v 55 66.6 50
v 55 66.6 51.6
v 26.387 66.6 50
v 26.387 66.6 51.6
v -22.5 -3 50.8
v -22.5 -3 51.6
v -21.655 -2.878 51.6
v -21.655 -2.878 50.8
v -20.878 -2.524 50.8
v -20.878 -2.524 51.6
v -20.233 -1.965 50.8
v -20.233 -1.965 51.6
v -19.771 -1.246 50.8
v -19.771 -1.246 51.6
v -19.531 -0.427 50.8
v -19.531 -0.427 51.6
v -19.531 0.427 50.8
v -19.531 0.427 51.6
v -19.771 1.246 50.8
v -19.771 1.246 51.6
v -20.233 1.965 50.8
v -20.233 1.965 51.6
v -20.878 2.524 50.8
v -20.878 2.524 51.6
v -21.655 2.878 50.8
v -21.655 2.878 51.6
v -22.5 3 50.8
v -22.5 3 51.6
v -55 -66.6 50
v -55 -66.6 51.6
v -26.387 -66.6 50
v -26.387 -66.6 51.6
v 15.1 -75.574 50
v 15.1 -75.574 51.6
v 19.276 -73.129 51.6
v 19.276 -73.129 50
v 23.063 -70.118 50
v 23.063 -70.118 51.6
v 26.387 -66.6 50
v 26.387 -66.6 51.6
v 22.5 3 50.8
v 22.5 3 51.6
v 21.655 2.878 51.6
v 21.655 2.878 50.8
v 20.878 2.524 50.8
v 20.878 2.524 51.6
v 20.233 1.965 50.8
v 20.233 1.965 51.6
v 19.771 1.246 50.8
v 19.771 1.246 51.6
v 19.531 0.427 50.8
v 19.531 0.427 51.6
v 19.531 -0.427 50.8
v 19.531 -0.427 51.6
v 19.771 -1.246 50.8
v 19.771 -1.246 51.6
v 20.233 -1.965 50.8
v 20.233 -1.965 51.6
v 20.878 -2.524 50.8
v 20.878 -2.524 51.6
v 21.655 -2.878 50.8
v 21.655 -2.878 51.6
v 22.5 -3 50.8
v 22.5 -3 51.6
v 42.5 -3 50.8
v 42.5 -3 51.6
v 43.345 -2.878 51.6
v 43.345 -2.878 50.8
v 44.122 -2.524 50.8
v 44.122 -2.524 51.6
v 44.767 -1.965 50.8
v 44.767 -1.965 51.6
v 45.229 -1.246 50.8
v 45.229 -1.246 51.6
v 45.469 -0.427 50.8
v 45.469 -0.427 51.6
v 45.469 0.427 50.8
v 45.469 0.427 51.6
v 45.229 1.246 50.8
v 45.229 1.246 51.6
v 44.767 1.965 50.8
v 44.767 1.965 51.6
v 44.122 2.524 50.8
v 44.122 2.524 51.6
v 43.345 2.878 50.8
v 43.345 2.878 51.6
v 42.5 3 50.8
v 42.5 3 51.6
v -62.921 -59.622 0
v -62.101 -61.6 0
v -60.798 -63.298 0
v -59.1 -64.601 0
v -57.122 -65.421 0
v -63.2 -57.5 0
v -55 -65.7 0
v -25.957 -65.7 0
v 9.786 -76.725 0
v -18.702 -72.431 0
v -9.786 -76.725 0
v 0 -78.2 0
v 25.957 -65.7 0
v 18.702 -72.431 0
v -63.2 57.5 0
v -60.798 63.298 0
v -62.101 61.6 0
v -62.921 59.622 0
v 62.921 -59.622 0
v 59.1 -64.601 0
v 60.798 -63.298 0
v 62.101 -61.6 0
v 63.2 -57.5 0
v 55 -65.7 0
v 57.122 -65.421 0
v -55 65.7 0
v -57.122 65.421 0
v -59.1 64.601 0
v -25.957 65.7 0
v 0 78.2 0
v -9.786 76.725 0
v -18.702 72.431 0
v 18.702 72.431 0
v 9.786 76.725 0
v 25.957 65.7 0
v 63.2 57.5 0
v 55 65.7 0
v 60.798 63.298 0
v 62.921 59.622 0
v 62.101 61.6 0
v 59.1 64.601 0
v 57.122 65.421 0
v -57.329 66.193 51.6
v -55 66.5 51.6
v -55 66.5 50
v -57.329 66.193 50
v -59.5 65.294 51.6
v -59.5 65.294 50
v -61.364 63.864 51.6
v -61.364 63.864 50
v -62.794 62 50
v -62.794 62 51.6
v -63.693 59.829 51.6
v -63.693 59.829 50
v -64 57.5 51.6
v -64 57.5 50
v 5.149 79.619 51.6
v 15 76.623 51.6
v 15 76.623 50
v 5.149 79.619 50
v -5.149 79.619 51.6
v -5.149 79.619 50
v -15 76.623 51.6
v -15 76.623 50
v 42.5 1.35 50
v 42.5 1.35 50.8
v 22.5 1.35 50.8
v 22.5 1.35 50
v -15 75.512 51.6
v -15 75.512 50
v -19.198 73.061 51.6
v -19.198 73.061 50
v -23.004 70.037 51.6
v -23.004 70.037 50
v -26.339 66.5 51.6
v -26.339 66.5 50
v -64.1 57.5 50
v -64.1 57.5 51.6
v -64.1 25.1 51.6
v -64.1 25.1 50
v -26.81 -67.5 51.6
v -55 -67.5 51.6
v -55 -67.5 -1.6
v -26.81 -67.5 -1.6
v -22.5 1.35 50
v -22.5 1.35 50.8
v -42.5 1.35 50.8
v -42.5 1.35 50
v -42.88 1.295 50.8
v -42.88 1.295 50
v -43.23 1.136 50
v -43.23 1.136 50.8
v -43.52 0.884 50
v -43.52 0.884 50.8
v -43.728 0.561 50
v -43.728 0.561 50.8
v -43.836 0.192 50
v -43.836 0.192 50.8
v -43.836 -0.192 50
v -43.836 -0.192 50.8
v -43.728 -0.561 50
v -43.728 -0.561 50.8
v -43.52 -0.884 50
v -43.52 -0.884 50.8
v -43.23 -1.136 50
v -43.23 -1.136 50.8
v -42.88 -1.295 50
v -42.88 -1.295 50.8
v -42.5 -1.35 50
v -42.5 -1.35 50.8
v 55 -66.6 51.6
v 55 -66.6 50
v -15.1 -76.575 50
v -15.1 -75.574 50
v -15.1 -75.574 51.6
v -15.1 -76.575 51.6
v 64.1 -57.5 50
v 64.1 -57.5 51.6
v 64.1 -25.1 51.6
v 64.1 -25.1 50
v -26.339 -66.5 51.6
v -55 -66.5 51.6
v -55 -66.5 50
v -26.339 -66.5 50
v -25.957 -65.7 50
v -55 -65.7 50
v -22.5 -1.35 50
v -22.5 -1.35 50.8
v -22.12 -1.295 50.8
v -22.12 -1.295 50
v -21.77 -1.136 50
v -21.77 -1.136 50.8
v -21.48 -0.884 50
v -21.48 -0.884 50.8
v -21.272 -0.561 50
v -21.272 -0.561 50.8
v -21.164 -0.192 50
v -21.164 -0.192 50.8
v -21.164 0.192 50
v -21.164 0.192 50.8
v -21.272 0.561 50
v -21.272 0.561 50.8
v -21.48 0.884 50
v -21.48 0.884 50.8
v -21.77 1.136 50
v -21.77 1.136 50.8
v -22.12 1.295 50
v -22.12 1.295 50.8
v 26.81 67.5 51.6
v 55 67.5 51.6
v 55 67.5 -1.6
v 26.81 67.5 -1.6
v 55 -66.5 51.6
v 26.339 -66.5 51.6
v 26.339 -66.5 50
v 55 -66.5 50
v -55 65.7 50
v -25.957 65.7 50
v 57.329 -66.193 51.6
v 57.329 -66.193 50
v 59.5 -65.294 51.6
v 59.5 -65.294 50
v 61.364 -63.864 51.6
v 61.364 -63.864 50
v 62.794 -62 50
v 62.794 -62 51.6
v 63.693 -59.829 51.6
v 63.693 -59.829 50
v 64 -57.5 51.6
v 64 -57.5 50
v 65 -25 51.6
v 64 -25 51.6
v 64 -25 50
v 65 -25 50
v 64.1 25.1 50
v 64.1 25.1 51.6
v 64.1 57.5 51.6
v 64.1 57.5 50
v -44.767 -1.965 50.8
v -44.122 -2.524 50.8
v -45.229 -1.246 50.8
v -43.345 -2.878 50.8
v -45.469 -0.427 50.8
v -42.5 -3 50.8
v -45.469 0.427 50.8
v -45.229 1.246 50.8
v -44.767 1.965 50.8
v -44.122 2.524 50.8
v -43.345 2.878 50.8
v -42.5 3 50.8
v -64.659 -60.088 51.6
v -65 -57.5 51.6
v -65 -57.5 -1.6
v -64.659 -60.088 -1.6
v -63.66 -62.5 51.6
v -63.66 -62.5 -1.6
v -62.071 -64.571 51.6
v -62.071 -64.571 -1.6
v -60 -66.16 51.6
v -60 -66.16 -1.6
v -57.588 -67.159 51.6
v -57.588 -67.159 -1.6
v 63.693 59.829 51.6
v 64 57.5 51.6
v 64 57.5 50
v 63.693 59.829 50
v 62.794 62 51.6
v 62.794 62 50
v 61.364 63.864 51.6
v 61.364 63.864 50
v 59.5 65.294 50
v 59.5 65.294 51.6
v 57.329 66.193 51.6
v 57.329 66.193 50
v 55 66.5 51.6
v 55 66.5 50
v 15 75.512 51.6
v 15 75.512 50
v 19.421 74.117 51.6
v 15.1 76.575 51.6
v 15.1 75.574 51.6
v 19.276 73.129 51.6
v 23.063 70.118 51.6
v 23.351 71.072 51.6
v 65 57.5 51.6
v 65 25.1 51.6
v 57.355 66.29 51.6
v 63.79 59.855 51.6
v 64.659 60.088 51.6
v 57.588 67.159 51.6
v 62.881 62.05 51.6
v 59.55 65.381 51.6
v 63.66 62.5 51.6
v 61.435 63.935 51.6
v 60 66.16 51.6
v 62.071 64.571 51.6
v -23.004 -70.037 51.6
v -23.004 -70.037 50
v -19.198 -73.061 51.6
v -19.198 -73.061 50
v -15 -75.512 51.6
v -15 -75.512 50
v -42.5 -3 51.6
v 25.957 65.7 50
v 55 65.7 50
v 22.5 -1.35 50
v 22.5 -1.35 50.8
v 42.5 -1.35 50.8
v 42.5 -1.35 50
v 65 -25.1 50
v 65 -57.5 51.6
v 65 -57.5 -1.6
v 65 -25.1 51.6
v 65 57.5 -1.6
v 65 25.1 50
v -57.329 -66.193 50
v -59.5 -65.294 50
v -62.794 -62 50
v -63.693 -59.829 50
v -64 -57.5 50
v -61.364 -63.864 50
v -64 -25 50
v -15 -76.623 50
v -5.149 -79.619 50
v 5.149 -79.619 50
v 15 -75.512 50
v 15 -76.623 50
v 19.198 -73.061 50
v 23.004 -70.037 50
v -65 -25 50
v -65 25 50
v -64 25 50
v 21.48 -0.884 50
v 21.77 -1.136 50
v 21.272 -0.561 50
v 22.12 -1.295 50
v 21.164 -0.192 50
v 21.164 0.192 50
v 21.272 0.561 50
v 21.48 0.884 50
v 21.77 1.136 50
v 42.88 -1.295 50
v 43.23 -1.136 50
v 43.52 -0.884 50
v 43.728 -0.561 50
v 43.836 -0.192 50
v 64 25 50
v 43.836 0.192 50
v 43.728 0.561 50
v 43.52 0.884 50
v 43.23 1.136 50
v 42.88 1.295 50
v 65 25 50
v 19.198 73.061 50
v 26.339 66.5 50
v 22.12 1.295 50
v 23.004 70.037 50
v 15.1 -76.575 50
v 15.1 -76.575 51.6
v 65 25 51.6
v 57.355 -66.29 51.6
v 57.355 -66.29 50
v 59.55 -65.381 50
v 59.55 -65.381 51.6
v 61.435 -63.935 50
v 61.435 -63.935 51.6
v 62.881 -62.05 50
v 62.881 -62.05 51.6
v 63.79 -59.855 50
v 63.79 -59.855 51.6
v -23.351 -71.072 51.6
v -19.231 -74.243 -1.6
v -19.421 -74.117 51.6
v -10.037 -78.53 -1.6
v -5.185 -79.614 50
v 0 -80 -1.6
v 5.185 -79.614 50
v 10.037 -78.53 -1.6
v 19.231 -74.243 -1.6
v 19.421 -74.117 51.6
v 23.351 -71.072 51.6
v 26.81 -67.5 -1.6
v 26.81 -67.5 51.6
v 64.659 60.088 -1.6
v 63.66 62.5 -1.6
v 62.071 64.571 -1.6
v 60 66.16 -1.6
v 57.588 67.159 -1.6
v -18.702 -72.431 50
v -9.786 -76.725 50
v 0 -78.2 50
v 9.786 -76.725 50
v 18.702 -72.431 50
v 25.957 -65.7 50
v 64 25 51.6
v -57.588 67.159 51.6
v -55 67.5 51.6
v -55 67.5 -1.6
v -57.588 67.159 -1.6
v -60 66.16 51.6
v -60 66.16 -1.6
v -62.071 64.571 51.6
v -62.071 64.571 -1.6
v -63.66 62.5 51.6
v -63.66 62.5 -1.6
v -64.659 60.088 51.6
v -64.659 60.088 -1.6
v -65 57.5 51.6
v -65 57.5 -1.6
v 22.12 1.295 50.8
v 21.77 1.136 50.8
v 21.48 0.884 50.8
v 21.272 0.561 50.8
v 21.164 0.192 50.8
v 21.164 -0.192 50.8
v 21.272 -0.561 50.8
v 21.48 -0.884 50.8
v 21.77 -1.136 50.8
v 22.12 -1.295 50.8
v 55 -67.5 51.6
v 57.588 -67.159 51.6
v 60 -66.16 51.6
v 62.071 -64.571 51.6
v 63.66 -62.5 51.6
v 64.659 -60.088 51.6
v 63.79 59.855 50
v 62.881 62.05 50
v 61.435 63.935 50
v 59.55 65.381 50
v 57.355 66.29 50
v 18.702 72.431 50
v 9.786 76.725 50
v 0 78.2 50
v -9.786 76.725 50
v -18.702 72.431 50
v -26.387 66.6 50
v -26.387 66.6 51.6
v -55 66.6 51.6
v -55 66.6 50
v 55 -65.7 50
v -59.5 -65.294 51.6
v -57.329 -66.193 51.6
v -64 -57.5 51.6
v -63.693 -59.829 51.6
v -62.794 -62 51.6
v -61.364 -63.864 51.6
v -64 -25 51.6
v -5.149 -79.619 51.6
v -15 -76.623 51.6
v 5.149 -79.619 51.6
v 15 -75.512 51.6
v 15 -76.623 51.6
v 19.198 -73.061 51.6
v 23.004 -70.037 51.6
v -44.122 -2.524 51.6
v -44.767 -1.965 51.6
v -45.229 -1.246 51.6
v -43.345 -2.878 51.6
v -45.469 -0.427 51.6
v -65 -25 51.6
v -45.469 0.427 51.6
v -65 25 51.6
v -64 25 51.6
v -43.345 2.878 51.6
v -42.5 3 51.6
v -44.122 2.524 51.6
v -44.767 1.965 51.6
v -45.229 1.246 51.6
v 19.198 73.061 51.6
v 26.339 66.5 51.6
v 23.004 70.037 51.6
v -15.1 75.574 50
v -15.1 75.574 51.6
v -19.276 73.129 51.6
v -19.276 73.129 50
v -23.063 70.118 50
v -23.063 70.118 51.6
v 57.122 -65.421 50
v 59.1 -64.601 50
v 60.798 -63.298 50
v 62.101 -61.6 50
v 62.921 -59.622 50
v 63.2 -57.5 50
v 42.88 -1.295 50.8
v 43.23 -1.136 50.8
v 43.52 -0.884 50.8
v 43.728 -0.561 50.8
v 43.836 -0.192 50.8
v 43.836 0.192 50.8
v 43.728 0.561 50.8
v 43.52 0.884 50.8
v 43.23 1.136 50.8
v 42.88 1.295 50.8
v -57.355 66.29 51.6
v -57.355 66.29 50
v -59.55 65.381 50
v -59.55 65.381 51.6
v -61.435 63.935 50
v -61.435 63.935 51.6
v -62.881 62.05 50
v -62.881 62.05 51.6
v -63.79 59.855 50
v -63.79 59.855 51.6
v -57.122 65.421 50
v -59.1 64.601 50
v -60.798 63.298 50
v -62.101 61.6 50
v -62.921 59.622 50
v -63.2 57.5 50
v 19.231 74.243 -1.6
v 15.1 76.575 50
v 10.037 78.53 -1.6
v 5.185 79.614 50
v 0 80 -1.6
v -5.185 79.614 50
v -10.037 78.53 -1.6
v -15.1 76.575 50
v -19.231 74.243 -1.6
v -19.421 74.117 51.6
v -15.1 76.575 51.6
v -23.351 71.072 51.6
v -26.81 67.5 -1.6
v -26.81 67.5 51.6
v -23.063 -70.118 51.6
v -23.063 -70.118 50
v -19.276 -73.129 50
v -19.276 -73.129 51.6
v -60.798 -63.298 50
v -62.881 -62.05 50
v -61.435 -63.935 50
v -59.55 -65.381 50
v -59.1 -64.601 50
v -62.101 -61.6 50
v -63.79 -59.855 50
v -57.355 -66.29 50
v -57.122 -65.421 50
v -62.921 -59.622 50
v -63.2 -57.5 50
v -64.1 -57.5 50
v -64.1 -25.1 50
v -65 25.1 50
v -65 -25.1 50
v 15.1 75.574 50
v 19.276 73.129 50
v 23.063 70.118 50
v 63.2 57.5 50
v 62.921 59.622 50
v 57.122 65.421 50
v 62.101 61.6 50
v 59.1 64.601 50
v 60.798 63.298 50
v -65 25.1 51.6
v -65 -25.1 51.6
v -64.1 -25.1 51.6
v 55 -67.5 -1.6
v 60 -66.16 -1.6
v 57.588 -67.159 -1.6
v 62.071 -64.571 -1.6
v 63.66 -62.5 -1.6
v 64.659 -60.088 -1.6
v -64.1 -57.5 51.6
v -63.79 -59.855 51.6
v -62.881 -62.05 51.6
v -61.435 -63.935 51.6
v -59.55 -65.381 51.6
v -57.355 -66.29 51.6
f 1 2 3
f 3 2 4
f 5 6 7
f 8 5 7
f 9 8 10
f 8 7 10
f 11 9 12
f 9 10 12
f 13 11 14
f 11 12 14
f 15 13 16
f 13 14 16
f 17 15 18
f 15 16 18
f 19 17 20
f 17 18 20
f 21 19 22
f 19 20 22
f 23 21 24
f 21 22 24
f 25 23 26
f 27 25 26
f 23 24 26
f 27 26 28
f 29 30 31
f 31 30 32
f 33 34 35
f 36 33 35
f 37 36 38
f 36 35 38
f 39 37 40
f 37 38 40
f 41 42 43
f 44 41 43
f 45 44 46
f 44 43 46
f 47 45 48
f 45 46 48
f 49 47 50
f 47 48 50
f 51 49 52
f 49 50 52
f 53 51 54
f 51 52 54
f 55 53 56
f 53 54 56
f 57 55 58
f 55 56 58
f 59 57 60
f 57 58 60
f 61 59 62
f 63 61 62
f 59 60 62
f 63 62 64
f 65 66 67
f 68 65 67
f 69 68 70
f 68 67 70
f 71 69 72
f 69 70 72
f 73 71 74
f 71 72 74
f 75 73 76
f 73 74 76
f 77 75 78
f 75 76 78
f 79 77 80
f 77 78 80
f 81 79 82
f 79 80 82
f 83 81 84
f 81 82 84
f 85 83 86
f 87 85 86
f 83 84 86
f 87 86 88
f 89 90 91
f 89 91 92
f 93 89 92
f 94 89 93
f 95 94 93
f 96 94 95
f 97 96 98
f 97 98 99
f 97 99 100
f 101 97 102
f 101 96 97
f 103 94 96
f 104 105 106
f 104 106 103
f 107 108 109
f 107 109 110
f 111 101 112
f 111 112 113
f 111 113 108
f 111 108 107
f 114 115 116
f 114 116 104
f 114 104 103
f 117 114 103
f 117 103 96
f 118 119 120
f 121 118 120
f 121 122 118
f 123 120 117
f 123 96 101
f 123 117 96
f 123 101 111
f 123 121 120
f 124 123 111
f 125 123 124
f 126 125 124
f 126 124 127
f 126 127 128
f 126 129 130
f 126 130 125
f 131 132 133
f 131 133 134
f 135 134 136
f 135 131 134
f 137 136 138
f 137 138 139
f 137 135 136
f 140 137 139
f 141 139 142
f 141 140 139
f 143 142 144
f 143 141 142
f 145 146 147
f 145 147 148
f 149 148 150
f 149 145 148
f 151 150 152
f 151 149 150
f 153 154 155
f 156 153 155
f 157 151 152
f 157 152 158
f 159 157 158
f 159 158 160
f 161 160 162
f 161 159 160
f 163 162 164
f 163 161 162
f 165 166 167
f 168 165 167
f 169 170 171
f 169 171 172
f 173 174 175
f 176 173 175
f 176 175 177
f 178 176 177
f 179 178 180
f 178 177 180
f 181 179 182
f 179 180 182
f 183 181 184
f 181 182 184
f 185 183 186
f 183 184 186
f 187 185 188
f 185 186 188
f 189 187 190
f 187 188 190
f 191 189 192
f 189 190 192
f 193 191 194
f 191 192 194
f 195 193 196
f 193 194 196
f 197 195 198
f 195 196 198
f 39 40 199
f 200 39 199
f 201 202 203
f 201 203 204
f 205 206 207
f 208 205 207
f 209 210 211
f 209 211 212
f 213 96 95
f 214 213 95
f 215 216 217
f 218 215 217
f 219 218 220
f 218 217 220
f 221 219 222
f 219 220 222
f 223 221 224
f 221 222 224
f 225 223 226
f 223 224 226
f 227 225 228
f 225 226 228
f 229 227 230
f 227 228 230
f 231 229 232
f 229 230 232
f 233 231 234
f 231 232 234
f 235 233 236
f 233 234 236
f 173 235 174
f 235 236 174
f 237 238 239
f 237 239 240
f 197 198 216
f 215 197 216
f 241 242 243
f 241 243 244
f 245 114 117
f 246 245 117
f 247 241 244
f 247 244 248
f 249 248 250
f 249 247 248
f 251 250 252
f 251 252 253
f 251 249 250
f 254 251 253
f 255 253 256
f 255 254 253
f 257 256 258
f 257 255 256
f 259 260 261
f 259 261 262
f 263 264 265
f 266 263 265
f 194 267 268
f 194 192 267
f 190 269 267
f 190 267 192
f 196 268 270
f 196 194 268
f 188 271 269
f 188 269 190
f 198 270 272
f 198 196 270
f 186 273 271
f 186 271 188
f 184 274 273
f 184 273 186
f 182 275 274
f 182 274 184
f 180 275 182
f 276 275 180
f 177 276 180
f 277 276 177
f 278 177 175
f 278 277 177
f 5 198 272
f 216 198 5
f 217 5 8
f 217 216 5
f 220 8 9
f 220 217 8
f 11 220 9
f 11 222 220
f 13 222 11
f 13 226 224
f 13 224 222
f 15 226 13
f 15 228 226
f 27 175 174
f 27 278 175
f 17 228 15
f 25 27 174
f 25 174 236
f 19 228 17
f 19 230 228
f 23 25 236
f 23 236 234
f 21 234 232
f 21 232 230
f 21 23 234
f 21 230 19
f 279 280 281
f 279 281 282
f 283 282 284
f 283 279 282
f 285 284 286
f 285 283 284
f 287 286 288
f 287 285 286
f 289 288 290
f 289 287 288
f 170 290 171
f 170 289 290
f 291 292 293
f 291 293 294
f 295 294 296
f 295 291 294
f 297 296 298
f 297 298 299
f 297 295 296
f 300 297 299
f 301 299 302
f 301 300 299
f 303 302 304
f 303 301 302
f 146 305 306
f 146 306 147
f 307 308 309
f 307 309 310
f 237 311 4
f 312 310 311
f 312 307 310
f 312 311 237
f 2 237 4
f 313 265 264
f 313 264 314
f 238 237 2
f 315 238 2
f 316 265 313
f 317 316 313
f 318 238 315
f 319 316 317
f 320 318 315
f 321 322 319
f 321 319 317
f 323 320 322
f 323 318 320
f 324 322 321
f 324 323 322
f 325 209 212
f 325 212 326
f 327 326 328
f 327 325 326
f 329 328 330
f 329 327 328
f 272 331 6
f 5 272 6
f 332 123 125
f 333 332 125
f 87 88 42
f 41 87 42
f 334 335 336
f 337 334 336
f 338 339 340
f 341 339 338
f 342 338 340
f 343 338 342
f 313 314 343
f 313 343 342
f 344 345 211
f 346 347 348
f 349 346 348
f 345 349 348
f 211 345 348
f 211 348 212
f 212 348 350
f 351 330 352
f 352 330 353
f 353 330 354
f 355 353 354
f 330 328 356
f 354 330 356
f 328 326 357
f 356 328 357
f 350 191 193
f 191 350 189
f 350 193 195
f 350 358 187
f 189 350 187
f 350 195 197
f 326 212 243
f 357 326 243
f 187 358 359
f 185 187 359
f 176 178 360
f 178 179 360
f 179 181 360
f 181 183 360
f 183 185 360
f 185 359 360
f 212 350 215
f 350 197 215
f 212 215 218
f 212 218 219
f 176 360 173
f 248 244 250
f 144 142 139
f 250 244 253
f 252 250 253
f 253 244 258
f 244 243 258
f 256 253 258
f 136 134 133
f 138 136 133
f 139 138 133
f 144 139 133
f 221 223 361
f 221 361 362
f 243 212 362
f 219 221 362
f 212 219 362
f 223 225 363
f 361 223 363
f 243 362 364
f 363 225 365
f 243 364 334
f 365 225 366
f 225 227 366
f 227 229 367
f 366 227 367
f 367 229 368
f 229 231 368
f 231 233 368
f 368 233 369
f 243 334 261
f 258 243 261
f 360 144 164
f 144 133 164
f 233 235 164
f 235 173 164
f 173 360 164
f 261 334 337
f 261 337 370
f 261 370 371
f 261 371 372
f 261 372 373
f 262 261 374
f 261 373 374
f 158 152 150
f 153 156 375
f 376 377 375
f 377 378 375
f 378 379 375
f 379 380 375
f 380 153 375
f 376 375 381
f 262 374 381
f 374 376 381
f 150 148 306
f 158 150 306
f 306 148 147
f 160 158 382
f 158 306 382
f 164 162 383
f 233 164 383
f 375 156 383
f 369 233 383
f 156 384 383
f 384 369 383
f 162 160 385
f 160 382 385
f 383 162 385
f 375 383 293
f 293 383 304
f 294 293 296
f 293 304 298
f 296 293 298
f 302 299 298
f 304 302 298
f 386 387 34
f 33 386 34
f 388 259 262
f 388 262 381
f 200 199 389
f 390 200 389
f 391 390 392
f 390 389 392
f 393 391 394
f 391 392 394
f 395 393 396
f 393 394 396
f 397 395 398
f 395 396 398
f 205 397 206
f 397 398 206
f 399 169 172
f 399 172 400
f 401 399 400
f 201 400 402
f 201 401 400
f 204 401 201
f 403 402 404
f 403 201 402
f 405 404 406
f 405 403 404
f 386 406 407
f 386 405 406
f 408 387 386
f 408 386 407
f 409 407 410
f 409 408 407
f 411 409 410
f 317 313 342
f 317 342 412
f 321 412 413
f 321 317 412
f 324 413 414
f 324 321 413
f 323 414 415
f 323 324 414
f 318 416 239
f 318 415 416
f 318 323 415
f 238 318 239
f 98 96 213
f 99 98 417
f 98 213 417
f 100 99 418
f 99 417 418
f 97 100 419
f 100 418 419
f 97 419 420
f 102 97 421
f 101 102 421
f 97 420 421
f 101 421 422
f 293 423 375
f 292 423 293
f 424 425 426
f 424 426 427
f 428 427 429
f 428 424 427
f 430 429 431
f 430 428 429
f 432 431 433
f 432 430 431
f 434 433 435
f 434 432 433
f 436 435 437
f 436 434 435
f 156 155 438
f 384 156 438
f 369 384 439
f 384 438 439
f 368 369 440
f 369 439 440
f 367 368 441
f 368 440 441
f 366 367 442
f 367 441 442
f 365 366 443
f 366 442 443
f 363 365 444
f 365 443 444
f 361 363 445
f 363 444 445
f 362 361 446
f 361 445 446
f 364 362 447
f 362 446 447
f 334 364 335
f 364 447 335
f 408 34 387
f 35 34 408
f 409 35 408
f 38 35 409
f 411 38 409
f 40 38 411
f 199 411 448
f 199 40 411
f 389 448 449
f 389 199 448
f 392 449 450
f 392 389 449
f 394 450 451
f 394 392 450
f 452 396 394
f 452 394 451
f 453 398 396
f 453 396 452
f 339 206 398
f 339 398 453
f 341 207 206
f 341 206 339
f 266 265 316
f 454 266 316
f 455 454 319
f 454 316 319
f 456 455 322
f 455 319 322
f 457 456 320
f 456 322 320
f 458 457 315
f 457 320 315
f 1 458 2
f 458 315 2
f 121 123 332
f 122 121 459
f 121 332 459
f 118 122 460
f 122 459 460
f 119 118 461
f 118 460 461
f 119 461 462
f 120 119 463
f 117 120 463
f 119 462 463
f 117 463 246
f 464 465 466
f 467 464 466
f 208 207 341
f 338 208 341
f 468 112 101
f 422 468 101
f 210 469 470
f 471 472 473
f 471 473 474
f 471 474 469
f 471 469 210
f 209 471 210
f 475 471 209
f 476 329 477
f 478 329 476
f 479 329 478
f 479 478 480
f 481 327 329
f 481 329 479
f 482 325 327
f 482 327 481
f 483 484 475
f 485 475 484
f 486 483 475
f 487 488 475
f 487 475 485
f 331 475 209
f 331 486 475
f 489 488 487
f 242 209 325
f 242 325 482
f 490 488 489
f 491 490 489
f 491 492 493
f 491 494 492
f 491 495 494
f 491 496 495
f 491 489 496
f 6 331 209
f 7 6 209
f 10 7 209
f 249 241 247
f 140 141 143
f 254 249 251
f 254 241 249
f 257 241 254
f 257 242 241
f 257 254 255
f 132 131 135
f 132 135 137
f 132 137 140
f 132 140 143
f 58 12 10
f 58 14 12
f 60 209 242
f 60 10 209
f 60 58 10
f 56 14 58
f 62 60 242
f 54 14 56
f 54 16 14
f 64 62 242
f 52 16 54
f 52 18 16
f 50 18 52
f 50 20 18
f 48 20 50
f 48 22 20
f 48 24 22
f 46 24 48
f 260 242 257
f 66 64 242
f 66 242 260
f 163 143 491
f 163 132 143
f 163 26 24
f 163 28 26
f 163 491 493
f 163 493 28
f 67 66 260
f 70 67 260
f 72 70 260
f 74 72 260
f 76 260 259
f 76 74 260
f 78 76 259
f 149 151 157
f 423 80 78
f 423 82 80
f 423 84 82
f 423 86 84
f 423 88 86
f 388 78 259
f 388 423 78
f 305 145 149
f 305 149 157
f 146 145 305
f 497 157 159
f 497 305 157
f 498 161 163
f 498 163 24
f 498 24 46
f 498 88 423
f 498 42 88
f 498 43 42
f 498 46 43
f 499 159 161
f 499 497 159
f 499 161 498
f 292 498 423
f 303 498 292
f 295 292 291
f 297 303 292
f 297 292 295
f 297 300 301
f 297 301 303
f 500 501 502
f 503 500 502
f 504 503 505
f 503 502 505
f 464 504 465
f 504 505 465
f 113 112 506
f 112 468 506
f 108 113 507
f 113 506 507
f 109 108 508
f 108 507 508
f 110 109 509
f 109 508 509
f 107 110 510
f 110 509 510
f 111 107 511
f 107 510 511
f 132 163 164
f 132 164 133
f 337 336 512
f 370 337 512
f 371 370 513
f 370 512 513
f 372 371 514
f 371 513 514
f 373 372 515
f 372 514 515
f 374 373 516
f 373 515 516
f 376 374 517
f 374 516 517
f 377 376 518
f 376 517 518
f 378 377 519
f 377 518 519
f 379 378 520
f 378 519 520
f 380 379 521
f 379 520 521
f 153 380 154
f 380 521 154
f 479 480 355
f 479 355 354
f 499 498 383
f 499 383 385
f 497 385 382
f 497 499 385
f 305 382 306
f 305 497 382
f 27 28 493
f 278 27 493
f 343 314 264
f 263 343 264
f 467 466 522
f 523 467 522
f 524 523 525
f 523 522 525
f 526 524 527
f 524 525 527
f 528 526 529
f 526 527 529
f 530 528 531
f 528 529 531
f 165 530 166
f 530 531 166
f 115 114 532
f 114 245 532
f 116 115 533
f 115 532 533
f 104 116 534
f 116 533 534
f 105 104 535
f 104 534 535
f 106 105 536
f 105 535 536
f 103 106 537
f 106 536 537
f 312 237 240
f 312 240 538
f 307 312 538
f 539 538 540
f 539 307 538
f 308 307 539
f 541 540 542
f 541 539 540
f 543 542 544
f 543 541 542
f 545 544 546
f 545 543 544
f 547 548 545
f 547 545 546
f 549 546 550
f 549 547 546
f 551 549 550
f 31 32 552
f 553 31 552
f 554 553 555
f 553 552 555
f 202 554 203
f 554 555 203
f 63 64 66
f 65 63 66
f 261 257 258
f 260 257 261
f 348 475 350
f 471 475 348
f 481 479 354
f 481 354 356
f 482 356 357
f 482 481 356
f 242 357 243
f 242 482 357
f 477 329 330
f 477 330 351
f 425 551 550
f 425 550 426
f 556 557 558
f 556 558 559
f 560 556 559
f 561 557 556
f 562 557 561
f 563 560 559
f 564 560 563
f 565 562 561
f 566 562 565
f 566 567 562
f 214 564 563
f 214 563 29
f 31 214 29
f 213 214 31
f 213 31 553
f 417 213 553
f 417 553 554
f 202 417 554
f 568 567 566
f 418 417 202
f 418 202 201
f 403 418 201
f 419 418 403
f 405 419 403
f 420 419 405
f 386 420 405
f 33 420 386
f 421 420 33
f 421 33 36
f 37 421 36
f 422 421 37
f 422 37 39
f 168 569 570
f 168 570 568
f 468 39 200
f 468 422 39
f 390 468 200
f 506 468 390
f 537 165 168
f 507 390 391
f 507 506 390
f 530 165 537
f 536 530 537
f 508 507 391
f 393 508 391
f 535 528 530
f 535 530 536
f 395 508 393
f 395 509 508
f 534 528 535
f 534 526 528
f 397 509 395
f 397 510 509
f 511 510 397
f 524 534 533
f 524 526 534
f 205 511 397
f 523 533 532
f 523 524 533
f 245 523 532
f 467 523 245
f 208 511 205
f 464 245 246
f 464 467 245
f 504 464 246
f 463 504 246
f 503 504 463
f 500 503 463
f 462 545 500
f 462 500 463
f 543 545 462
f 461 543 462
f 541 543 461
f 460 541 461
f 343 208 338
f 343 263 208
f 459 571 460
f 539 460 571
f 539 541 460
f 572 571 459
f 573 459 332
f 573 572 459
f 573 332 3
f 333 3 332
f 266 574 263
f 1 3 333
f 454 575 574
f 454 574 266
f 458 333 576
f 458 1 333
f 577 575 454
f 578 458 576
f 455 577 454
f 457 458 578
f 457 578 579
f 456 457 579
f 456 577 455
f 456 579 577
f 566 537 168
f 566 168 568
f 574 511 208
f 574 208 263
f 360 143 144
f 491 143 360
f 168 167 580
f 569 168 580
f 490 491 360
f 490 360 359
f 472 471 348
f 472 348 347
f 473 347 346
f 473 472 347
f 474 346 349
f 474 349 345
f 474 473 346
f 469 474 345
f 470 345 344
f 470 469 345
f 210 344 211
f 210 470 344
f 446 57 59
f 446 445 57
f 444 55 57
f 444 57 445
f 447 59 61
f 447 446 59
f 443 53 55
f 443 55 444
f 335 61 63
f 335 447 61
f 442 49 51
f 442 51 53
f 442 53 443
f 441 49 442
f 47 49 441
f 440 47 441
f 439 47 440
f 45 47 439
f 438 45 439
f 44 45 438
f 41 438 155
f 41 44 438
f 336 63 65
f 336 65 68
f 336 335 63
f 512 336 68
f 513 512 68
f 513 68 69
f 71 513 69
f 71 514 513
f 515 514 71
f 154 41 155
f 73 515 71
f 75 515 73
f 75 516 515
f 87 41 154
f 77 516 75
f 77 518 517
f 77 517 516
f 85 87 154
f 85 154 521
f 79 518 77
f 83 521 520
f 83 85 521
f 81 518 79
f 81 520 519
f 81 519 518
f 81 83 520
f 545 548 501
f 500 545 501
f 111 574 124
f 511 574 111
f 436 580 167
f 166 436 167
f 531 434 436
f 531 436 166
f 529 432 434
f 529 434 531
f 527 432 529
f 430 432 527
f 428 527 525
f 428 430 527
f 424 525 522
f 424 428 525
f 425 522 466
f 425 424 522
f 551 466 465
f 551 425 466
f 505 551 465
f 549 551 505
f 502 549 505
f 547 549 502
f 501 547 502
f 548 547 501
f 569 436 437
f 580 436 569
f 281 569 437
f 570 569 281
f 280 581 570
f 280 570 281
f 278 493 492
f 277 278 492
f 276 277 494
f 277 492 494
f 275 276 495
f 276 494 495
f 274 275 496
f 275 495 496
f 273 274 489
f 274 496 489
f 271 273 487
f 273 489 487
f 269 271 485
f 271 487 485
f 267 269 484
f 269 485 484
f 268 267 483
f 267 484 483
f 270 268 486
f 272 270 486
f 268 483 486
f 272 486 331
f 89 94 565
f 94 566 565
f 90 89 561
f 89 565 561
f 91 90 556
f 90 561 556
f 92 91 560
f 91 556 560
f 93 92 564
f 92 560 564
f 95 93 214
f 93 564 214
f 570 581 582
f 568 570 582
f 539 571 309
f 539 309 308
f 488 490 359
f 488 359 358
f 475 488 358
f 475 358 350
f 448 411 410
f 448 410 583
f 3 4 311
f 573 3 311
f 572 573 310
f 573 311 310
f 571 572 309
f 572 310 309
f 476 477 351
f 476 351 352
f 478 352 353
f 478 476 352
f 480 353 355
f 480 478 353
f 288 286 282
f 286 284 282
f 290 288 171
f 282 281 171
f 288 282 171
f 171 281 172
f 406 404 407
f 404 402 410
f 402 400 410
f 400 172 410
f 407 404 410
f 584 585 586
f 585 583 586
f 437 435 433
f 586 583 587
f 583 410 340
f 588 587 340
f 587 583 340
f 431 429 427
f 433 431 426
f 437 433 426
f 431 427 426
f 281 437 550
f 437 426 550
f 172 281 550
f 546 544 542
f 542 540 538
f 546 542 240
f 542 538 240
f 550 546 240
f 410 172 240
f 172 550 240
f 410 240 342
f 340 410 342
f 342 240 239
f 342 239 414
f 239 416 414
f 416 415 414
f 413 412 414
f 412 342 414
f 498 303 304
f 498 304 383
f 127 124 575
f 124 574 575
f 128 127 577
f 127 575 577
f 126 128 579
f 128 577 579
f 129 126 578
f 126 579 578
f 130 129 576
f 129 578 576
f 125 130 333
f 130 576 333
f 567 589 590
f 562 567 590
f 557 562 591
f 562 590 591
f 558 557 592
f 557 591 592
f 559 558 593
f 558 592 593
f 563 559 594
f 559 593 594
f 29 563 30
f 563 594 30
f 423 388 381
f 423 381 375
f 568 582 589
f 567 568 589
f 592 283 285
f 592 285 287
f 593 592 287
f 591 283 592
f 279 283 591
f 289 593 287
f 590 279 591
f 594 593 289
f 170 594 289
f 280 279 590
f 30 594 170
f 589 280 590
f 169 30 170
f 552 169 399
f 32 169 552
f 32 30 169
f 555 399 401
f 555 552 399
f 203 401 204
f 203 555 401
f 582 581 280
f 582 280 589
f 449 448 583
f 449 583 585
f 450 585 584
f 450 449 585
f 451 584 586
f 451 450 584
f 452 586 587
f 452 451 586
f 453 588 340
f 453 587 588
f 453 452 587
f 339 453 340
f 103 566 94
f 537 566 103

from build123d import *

# Parameters (mm, degrees)
F11_DEPTH = 53.201
F12_DEPTH = 0.8


with BuildPart() as f4:
    # F4: sweep along a path in F3
    with BuildLine(Plane.XZ) as f4_path:
        Line((0, 0), (0, -1.6))
    # F1 (on Top) → F4 (sweep)
    with BuildSketch(Plane.XY):
        with BuildLine():
            ThreePointArc((-55, 67.5), (-62.0710678119, 64.5710678119), (-65, 57.5))
            Line((-65, 57.5), (-65, -57.5))
            ThreePointArc((-65, -57.5), (-62.0710678119, -64.5710678119), (-55, -67.5))
            Line((-55, -67.5), (-26.8095132369, -67.5))
            ThreePointArc((-26.8095132369, -67.5), (0, -80), (26.8095132369, -67.5))
            Line((26.8095132369, -67.5), (55, -67.5))
            ThreePointArc((55, -67.5), (62.0710678119, -64.5710678119), (65, -57.5))
            Line((65, -57.5), (65, 57.5))
            ThreePointArc((65, 57.5), (62.0710678119, 64.5710678119), (55, 67.5))
            Line((55, 67.5), (26.8095132369, 67.5))
            ThreePointArc((26.8095132369, 67.5), (0, 80), (-26.8095132369, 67.5))
            Line((-26.8095132369, 67.5), (-55, 67.5))
        make_face()
    sweep(path=f4_path.line)

    # F5: sweep along a path in F3
    with BuildLine(Plane.XZ) as f5_path:
        Line((0, 0), (0, 50))
        Line((0, 50), (0, 51.6))
    # F2 (on Top) → F5 (sweep)
    with BuildSketch(Plane.XY):
        with BuildLine():
            ThreePointArc((26.8095132369, 67.5), (0, 80), (-26.8095132369, 67.5))
            Line((-26.8095132369, 67.5), (-55, 67.5))
            ThreePointArc((-55, 67.5), (-62.0710678119, 64.5710678119), (-65, 57.5))
            Line((-65, 57.5), (-65, -57.5))
            ThreePointArc((-65, -57.5), (-62.0710678119, -64.5710678119), (-55, -67.5))
            Line((-55, -67.5), (-26.8095132369, -67.5))
            ThreePointArc((-26.8095132369, -67.5), (0, -80), (26.8095132369, -67.5))
            Line((26.8095132369, -67.5), (55, -67.5))
            ThreePointArc((55, -67.5), (62.0710678119, -64.5710678119), (65, -57.5))
            Line((65, -57.5), (65, 57.5))
            ThreePointArc((65, 57.5), (62.0710678119, 64.5710678119), (55, 67.5))
            Line((55, 67.5), (26.8095132369, 67.5))
        make_face()
        with BuildLine():
            ThreePointArc((-63.2, 57.5), (-60.7982756057, 63.2982756057), (-55, 65.7))
            Line((-55, 65.7), (-25.9566947048, 65.7))
            ThreePointArc((-25.9566947048, 65.7), (0, 78.2), (25.9566947048, 65.7))
            Line((25.9566947048, 65.7), (55, 65.7))
            ThreePointArc((55, 65.7), (60.7982756057, 63.2982756057), (63.2, 57.5))
            Line((63.2, 57.5), (63.2, -57.5))
            ThreePointArc((63.2, -57.5), (60.7982756057, -63.2982756057), (55, -65.7))
            Line((55, -65.7), (25.9566947048, -65.7))
            ThreePointArc((25.9566947048, -65.7), (0, -78.2), (-25.9566947048, -65.7))
            Line((-25.9566947048, -65.7), (-55, -65.7))
            ThreePointArc((-55, -65.7), (-60.7982756057, -63.2982756057), (-63.2, -57.5))
            Line((-63.2, -57.5), (-63.2, 57.5))
        make_face(mode=Mode.SUBTRACT)
    sweep(path=f5_path.line)

    # F8: sweep along a path in F3
    with BuildLine(Plane.XZ) as f8_path:
        Line((0, 50), (0, 51.6))
    # F7 (on face) → F8 (sweep, cut)
    with BuildSketch(Plane.XY.offset(51.6)):
        with BuildLine():
            ThreePointArc((-15.1, 75.5744991782), (-21.2230737261, 71.6906564478), (-26.3865496039, 66.6))
            Line((-26.3865496039, 66.6), (-55, 66.6))
            ThreePointArc((-55, 66.6), (-61.4346717088, 63.9346717088), (-64.1, 57.5))
            Line((-64.1, 57.5), (-64.1, 25.1))
            Line((-64.1, 25.1), (-65.1, 25.1))
            Line((-65.1, 25.1), (-65.1, -25.1))
            Line((-65.1, -25.1), (-64.1, -25.1))
            Line((-64.1, -25.1), (-64.1, -57.5))
            ThreePointArc((-64.1, -57.5), (-61.4346717088, -63.9346717088), (-55, -66.6))
            Line((-55, -66.6), (-26.3865496039, -66.6))
            ThreePointArc((-26.3865496039, -66.6), (-21.2230737261, -71.6906564478), (-15.1, -75.5744991782))
            Line((-15.1, -75.5744991782), (-15.1, -76.6859590355))
            ThreePointArc((-15.1, -76.6859590355), (0, -80.1), (15.1, -76.6859590355))
            Line((15.1, -76.6859590355), (15.1, -75.5744991782))
            ThreePointArc((15.1, -75.5744991782), (21.2230737261, -71.6906564478), (26.3865496039, -66.6))
            Line((26.3865496039, -66.6), (55, -66.6))
            ThreePointArc((55, -66.6), (61.4346717088, -63.9346717088), (64.1, -57.5))
            Line((64.1, -57.5), (64.1, -25.1))
            Line((64.1, -25.1), (65.1, -25.1))
            Line((65.1, -25.1), (65.1, 25.1))
            Line((65.1, 25.1), (64.1, 25.1))
            Line((64.1, 25.1), (64.1, 57.5))
            ThreePointArc((64.1, 57.5), (61.4346717088, 63.9346717088), (55, 66.6))
            Line((55, 66.6), (26.3865496039, 66.6))
            ThreePointArc((26.3865496039, 66.6), (21.2230737261, 71.6906564478), (15.1, 75.5744991782))
            Line((15.1, 75.5744991782), (15.1, 76.6859590355))
            ThreePointArc((15.1, 76.6859590355), (0, 80.1), (-15.1, 76.6859590355))
            Line((-15.1, 76.6859590355), (-15.1, 75.5744991782))
        make_face()
    sweep(path=f8_path.line, mode=Mode.SUBTRACT)


with BuildPart() as f9:
    # F9: sweep along a path in F3
    with BuildLine(Plane.XZ) as f9_path:
        Line((0, 50), (0, 51.6))
    # F6 (on face) → F9 (sweep)
    with BuildSketch(Plane.XY.offset(51.6)):
        with BuildLine():
            ThreePointArc((-15, 75.5122926048), (-21.1550552437, 71.6169802501), (-26.3391343821, 66.5))
            Line((-26.3391343821, 66.5), (-55, 66.5))
            ThreePointArc((-55, 66.5), (-61.3639610307, 63.8639610307), (-64, 57.5))
            Line((-64, 57.5), (-64, 25))
            Line((-64, 25), (-65, 25))
            Line((-65, 25), (-65, -25))
            Line((-65, -25), (-64, -25))
            Line((-64, -25), (-64, -57.5))
            ThreePointArc((-64, -57.5), (-61.3639610307, -63.8639610307), (-55, -66.5))
            Line((-55, -66.5), (-26.3391343821, -66.5))
            ThreePointArc((-26.3391343821, -66.5), (-21.1550552437, -71.6169802501), (-15, -75.5122926048))
            Line((-15, -75.5122926048), (-15, -76.6227766017))
            ThreePointArc((-15, -76.6227766017), (0, -80), (15, -76.6227766017))
            Line((15, -76.6227766017), (15, -75.5122926048))
            ThreePointArc((15, -75.5122926048), (21.1550552437, -71.6169802501), (26.3391343821, -66.5))
            Line((26.3391343821, -66.5), (55, -66.5))
            ThreePointArc((55, -66.5), (61.3639610307, -63.8639610307), (64, -57.5))
            Line((64, -57.5), (64, -25))
            Line((64, -25), (65, -25))
            Line((65, -25), (65, 25))
            Line((65, 25), (64, 25))
            Line((64, 25), (64, 57.5))
            ThreePointArc((64, 57.5), (61.3639610307, 63.8639610307), (55, 66.5))
            Line((55, 66.5), (26.3391343821, 66.5))
            ThreePointArc((26.3391343821, 66.5), (21.1550552437, 71.6169802501), (15, 75.5122926048))
            Line((15, 75.5122926048), (15, 76.6227766017))
            ThreePointArc((15, 76.6227766017), (0, 80), (-15, 76.6227766017))
            Line((-15, 76.6227766017), (-15, 75.5122926048))
        make_face()
    sweep(path=f9_path.line)

    # F10 (on face) → F11 (cut, through all)
    with BuildSketch(Plane.XY.offset(51.6)):
        with BuildLine():
            ThreePointArc((-22.5, -1.35), (-21.15, 0), (-22.5, 1.35))
            Line((-22.5, 1.35), (-42.5, 1.35))
            ThreePointArc((-42.5, 1.35), (-43.85, 0), (-42.5, -1.35))
            Line((-42.5, -1.35), (-22.5, -1.35))
        make_face()
        with BuildLine():
            Line((42.5, 1.35), (22.5, 1.35))
            ThreePointArc((22.5, 1.35), (21.15, 0), (22.5, -1.35))
            Line((22.5, -1.35), (42.5, -1.35))
            ThreePointArc((42.5, -1.35), (43.85, 0), (42.5, 1.35))
        make_face()
    extrude(amount=-F11_DEPTH, mode=Mode.SUBTRACT)

    # F10 (on face) → F12 (cut)
    with BuildSketch(Plane.XY.offset(51.6)):
        with BuildLine():
            ThreePointArc((-22.5, -3), (-19.5, 0), (-22.5, 3))
            Line((-22.5, 3), (-42.5, 3))
            ThreePointArc((-42.5, 3), (-45.5, 0), (-42.5, -3))
            Line((-42.5, -3), (-22.5, -3))
        make_face()
        with BuildLine():
            Line((-42.5, 1.35), (-22.5, 1.35))
            ThreePointArc((-22.5, 1.35), (-21.15, 0), (-22.5, -1.35))
            Line((-22.5, -1.35), (-42.5, -1.35))
            ThreePointArc((-42.5, -1.35), (-43.85, 0), (-42.5, 1.35))
        make_face(mode=Mode.SUBTRACT)
        with BuildLine():
            Line((42.5, 3), (22.5, 3))
            ThreePointArc((22.5, 3), (19.5, 0), (22.5, -3))
            Line((22.5, -3), (42.5, -3))
            ThreePointArc((42.5, -3), (45.5, 0), (42.5, 3))
        make_face()
        with BuildLine():
            ThreePointArc((22.5, -1.35), (21.15, 0), (22.5, 1.35))
            Line((22.5, 1.35), (42.5, 1.35))
            ThreePointArc((42.5, 1.35), (43.85, 0), (42.5, -1.35))
            Line((42.5, -1.35), (22.5, -1.35))
        make_face(mode=Mode.SUBTRACT)
    extrude(amount=-F12_DEPTH, mode=Mode.SUBTRACT)


solid = Compound([f4.part, f9.part])
